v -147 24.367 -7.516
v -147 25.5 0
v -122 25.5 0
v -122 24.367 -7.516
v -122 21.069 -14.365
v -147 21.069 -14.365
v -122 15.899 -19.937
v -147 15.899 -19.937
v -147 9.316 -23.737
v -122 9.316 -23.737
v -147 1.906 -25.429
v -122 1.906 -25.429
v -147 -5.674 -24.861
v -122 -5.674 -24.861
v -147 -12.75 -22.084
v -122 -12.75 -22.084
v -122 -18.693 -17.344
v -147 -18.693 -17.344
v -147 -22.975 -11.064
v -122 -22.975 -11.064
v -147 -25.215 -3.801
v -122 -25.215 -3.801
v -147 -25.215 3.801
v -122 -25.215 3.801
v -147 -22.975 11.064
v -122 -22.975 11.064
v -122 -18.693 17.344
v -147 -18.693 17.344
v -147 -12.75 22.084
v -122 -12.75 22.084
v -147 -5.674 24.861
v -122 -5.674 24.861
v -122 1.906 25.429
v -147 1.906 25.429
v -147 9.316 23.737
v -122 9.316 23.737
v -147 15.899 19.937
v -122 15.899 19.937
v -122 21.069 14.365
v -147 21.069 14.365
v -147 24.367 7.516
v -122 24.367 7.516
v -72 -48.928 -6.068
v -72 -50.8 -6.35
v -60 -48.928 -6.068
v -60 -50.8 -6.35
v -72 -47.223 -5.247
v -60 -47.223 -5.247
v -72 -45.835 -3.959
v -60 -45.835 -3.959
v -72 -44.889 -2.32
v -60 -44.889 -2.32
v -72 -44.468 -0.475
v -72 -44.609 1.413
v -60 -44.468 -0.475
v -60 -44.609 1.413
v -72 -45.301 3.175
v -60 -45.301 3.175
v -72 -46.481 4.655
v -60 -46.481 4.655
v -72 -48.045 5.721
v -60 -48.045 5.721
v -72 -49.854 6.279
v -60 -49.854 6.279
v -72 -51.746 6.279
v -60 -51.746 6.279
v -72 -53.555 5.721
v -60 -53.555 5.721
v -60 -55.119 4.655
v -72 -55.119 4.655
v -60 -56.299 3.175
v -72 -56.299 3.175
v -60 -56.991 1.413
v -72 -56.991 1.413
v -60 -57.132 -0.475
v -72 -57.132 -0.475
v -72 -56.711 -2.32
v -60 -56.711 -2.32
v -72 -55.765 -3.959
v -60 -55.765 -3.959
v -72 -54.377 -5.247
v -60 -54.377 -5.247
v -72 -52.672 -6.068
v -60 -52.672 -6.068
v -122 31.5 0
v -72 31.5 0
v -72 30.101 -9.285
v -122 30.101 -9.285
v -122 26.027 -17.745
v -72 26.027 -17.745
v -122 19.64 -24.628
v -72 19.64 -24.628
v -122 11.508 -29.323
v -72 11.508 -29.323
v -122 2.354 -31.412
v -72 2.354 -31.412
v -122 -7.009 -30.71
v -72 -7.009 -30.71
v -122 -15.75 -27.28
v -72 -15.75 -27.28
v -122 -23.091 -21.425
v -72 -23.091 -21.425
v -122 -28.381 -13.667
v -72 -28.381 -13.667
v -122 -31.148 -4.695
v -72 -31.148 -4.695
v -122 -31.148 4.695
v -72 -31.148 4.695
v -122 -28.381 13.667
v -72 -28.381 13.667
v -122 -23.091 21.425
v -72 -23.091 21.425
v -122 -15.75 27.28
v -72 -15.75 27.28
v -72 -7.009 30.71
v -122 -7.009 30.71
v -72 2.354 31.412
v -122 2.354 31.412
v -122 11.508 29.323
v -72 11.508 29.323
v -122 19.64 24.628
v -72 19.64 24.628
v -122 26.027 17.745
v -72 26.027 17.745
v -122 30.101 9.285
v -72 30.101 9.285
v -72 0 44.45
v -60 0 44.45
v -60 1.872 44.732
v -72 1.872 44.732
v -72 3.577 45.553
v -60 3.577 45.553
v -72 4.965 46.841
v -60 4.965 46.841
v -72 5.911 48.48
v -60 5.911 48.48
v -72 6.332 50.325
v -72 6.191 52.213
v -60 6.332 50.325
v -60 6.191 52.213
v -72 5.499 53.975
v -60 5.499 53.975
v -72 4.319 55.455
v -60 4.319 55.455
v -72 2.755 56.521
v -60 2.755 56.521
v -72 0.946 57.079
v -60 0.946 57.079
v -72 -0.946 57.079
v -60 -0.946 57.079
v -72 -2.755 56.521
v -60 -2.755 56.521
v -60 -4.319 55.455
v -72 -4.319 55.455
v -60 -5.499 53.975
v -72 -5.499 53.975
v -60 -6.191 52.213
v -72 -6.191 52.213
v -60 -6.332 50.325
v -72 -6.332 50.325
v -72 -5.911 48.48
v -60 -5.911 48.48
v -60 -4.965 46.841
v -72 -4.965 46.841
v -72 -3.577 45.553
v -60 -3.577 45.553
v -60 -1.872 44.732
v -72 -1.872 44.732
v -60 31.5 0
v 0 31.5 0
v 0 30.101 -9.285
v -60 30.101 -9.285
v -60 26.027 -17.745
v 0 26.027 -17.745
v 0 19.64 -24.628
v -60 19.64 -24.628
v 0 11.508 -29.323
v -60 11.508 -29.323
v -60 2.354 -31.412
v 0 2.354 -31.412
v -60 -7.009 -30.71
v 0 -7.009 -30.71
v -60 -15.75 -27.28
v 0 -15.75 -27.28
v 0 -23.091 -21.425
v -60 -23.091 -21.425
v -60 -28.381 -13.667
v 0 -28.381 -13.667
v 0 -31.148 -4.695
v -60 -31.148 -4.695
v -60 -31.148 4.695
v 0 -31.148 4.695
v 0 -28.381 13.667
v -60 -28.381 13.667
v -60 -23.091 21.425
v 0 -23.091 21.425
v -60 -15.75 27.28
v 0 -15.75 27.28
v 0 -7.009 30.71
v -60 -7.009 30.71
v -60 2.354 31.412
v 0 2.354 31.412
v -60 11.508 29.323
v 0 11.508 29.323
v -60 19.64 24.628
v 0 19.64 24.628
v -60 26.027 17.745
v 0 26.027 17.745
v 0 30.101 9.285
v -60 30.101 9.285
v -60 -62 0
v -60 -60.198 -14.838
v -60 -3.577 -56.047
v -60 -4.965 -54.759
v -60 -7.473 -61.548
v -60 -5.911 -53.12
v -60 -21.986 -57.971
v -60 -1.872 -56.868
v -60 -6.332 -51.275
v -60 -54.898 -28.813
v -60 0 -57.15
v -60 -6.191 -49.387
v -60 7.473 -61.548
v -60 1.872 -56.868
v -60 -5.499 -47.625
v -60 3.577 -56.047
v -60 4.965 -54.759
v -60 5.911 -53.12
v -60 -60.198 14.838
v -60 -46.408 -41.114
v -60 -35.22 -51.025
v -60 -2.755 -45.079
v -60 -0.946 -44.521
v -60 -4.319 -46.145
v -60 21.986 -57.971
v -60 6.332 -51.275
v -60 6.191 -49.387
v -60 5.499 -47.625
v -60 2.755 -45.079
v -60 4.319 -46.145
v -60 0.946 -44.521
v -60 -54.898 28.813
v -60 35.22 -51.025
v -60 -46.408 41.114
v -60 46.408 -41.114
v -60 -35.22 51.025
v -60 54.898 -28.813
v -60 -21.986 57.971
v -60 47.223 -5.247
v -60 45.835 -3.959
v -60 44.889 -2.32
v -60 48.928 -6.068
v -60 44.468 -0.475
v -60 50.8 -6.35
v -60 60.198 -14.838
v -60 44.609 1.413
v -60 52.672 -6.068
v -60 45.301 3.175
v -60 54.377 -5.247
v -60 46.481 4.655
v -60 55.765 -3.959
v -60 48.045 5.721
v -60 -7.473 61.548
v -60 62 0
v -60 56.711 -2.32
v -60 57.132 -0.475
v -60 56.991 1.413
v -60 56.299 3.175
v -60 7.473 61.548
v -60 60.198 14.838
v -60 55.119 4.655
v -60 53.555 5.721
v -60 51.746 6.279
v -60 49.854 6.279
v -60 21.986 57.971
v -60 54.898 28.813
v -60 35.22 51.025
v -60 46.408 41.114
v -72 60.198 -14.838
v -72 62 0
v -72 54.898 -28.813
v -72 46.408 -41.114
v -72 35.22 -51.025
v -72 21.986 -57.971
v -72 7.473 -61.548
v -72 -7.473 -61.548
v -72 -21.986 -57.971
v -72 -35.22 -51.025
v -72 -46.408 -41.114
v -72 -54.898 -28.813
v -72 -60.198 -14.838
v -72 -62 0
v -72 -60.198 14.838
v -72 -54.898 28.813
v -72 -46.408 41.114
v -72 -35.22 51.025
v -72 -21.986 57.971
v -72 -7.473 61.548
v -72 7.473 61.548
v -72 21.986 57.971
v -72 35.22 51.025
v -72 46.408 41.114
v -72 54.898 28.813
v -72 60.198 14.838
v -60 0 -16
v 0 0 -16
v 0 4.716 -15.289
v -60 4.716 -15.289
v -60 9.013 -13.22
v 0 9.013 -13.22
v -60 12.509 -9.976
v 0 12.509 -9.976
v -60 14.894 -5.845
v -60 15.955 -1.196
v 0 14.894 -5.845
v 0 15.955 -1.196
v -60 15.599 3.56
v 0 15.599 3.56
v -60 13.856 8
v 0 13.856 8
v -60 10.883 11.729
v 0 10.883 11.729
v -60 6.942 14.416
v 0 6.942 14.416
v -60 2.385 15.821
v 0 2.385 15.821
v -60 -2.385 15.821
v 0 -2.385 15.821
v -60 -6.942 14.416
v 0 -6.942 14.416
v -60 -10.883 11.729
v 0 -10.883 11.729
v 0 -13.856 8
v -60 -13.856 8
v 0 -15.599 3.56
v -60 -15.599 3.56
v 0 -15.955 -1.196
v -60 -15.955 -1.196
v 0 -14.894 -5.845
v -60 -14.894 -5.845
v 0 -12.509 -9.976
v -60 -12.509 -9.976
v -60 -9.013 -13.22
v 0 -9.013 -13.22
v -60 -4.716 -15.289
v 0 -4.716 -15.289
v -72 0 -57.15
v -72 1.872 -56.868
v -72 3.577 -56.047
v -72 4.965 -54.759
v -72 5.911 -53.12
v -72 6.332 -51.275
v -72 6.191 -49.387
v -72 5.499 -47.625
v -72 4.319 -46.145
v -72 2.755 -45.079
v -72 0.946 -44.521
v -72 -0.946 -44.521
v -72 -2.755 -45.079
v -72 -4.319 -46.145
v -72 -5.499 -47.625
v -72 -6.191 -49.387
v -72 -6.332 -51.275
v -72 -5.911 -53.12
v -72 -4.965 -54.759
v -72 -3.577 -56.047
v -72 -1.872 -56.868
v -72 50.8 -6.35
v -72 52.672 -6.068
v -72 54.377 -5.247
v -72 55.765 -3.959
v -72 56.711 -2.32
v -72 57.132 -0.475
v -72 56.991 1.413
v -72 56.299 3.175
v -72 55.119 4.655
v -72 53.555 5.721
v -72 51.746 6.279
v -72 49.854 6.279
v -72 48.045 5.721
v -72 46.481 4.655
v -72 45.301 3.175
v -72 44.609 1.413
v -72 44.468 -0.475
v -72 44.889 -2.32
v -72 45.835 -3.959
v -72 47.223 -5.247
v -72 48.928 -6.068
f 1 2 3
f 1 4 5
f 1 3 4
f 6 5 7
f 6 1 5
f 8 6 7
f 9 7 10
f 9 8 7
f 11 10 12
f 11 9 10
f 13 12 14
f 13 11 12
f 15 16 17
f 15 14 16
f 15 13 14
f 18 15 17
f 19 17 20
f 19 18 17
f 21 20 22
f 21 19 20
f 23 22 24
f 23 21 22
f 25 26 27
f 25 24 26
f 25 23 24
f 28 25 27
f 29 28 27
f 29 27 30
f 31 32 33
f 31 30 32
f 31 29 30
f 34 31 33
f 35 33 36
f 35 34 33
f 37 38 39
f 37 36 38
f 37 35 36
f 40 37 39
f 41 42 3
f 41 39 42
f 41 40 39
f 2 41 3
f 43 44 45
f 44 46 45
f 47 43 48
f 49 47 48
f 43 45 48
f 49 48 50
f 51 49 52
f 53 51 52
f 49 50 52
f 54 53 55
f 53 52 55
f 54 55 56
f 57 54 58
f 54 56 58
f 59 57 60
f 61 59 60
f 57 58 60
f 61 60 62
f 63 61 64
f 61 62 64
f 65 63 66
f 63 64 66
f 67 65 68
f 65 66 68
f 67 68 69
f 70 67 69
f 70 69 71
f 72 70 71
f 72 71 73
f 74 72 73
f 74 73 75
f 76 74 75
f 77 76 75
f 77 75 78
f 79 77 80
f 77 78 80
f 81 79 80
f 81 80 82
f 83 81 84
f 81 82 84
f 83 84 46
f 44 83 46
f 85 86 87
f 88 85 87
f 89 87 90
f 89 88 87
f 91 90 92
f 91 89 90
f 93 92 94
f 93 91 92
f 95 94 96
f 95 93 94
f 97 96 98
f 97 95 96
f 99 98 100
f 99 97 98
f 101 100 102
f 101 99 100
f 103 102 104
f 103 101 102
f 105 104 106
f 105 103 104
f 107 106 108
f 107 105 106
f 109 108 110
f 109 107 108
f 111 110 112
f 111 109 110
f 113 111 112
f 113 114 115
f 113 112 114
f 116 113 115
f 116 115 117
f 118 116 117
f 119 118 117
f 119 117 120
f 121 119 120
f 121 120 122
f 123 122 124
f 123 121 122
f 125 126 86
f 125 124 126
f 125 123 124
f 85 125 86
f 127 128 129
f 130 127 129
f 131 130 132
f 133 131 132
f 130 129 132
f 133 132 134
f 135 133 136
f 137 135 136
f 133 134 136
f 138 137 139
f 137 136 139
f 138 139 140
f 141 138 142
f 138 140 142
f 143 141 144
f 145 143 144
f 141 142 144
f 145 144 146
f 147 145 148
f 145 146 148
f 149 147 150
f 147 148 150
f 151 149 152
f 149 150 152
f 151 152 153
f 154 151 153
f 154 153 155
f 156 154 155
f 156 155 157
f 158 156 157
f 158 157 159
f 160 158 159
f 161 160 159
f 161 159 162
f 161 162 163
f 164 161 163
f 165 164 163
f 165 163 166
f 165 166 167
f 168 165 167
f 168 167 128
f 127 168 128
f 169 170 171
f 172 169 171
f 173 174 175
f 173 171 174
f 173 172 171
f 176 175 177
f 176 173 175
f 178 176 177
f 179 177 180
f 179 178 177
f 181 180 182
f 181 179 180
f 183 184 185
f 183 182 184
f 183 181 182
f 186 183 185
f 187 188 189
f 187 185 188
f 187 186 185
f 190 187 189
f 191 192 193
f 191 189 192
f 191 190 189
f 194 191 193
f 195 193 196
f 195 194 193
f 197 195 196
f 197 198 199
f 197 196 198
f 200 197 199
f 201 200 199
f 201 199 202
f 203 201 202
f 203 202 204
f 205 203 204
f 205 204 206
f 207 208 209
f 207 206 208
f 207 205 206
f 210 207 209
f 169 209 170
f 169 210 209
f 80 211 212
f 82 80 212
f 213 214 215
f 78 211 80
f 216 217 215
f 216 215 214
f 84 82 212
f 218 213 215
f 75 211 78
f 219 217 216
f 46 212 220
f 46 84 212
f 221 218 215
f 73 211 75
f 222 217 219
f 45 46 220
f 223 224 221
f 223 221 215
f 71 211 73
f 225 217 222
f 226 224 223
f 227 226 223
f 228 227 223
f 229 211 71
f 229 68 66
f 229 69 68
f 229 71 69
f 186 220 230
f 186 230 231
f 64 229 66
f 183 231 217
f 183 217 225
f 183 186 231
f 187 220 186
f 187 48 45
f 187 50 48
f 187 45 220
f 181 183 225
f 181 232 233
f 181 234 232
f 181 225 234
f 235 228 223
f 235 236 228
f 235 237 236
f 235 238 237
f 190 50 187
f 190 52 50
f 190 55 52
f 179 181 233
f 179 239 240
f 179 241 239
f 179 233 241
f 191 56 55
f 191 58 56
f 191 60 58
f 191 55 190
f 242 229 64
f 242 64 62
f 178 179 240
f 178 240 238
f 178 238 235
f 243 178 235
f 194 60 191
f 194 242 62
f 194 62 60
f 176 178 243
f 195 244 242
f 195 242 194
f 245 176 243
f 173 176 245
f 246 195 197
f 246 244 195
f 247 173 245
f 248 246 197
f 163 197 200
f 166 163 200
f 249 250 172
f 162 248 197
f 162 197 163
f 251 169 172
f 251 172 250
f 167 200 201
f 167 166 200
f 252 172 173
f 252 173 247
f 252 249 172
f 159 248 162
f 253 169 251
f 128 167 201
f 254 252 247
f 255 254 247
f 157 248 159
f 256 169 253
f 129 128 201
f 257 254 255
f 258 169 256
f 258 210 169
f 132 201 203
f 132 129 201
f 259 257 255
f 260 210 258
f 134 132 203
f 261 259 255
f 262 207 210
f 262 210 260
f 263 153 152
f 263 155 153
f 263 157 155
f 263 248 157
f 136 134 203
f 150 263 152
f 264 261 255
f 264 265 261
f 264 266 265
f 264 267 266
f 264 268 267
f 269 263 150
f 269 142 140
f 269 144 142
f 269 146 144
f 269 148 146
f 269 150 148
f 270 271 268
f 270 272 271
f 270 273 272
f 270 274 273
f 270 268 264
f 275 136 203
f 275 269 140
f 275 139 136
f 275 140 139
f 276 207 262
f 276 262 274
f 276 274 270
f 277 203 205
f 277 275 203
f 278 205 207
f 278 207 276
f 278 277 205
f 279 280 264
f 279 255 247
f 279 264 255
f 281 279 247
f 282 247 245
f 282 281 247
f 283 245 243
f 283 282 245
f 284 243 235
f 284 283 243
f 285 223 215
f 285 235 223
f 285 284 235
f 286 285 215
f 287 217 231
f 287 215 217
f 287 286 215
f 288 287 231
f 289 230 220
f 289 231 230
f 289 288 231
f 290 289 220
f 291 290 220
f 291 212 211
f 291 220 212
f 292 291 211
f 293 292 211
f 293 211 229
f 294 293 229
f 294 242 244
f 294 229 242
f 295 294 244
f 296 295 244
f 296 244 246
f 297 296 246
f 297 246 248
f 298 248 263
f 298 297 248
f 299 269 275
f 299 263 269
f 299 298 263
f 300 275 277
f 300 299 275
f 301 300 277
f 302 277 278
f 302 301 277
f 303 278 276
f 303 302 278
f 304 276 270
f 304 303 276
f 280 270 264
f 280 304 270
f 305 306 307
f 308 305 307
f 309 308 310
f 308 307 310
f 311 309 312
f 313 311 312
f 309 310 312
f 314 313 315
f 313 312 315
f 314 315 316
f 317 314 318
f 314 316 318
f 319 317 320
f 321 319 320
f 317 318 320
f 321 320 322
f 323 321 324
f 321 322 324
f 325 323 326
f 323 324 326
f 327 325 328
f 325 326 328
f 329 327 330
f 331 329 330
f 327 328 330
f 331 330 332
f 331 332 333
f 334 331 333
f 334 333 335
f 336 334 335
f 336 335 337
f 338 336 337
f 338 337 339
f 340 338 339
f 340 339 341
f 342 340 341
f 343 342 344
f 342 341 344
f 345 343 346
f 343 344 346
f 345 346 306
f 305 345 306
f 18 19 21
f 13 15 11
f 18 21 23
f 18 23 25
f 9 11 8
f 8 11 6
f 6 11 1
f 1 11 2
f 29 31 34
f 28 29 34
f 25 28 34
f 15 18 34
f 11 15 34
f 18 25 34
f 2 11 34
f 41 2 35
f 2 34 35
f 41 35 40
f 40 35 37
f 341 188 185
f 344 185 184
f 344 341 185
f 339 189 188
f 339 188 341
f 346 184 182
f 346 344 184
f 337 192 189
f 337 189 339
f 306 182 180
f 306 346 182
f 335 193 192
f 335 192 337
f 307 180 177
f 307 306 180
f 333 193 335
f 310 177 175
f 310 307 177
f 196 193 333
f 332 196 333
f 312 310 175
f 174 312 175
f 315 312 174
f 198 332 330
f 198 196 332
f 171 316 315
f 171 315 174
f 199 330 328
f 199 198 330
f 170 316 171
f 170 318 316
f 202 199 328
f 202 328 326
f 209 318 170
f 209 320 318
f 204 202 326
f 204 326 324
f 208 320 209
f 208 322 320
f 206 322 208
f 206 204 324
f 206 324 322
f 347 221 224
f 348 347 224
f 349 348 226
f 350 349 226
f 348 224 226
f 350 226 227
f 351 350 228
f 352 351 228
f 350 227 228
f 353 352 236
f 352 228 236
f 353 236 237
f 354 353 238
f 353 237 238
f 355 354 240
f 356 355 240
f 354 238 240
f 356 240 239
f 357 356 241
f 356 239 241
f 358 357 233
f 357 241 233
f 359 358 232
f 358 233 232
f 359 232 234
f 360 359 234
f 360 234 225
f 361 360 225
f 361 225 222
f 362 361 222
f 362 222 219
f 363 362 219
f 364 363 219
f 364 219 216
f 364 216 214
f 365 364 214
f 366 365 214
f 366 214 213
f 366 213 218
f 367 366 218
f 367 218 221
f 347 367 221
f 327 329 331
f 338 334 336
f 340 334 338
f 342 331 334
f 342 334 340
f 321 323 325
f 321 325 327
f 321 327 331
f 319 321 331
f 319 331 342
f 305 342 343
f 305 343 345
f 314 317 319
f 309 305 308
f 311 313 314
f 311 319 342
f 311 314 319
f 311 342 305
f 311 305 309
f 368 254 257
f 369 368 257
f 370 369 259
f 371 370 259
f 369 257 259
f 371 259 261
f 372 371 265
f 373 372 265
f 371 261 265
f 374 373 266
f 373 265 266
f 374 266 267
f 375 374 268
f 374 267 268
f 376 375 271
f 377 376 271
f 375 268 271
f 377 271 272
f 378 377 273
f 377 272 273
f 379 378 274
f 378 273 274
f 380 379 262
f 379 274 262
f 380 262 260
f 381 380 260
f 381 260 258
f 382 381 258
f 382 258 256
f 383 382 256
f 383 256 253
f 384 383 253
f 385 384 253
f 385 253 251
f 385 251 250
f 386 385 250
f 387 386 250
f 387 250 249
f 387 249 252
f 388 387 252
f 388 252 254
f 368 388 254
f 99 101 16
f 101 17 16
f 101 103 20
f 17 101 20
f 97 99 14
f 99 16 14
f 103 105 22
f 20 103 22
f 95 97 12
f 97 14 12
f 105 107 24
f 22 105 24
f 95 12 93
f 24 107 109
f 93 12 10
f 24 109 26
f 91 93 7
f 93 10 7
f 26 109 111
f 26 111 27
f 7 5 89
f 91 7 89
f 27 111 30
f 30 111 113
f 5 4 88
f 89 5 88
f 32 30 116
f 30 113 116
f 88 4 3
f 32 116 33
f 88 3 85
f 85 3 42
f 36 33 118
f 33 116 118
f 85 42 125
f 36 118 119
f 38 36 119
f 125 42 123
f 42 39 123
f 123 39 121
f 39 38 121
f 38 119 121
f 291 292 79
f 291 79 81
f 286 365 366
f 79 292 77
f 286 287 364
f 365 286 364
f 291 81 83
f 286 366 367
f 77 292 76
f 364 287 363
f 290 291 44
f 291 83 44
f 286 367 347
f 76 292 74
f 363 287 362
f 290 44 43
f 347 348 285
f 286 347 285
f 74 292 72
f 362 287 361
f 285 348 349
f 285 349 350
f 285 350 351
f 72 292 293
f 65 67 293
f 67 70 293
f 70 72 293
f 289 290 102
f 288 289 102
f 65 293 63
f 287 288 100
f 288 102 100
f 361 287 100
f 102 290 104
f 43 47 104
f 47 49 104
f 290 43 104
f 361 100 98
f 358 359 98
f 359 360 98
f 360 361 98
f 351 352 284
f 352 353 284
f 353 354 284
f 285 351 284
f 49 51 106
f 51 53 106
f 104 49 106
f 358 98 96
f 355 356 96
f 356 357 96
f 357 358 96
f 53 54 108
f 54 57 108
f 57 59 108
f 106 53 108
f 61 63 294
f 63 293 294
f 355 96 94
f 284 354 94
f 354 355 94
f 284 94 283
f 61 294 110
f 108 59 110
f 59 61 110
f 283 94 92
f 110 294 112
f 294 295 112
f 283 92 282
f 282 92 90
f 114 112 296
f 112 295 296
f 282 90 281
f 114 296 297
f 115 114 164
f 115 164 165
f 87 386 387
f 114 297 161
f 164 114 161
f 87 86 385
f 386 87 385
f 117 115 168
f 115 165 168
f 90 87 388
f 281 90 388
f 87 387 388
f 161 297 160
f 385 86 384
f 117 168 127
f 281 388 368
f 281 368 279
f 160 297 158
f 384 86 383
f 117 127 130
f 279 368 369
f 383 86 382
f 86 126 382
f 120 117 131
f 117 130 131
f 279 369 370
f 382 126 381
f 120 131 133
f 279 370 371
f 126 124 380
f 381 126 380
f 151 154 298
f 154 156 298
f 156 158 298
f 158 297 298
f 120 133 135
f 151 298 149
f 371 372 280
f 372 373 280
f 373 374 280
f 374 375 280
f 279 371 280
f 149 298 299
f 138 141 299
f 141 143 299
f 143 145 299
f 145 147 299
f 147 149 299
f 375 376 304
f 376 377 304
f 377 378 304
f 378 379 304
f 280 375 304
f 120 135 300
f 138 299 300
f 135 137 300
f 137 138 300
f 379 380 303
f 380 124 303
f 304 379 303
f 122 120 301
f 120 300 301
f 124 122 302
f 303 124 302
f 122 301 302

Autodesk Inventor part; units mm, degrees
ref_plane "YZ Plane" through (0, 0, 0) normal (1, 0, 0) x (0, 1, 0)
ref_plane "XZ Plane" through (0, 0, 0) normal (0, 1, 0) x (-1, 0, 0)
ref_plane "XY Plane" through (0, 0, 0) normal (0, 0, 1) x (1, 0, 0)
sketch "Sketch1" plane through (0, 0, 0) normal (0, 0, 1) x (1, 0, 0)
  line L0 (0, 0) -> (0, 31.5)
  line L1 (0, 31.5) -> (-60, 31.5)
  line L2 (-60, 31.5) -> (-60, 62)
  line L3 (-60, 62) -> (-72, 62)
  line L4 (-72, 62) -> (-72, 31.5)
  line L5 (-72, 31.5) -> (-122, 31.5)
  line L6 (-122, 31.5) -> (-122, 25.5)
  line L7 (-122, 25.5) -> (-147, 25.5)
  line L8 (-147, 25.5) -> (-147, 0)
  line L9 (-147, 0) -> (0, 0)
  dimension "d0" = 31.5
  dimension "d1" = 60
  dimension "d2" = 30.5
  dimension "d3" = 12
  dimension "d4" = 30.5
  dimension "d5" = 50
  dimension "d6" = 6
  dimension "d7" = 25
revolve "Revolution1" add sketch "Sketch1" angle 360 about axis through (-147, 0, 0) along (1, 0, 0)
sketch "Sketch2" plane through (-60, 0, 0) normal (1, 0, 0) x (0, 0, -1)
  circle A0 centre (0, 50.8) radius 6.35
  circle A1 centre (-50.8, 0) radius 6.35
  circle A2 centre (50.8, 0) radius 6.35
  circle A3 centre (0, -50.8) radius 6.35
  line L0 (0, 0) -> (0, 50.8) construction
  line L1 (0, 0) -> (0, 50.8) construction
  line L2 (0, 0) -> (50.8, 0) construction
  line L3 (0, 0) -> (0, -50.8) construction
  line L4 (0, 0) -> (-50.8, 0) construction
  dimension "d9" = 12.7
  dimension "d10" = 50.8
  dimension "d11" = 12.7
  dimension "d12" = 12.7
  dimension "d13" = 12.7
extrude "Extrusion1" cut sketch "Sketch2" against normal through all
sketch "Sketch3" plane through (0, 0, 0) normal (1, 0, 0) x (0, 0, -1)
  circle A0 centre (0, 0) radius 16
  dimension "d16" = 32
extrude "Extrusion2" cut sketch "Sketch3" against normal blind 60
properties part number "pilot"
